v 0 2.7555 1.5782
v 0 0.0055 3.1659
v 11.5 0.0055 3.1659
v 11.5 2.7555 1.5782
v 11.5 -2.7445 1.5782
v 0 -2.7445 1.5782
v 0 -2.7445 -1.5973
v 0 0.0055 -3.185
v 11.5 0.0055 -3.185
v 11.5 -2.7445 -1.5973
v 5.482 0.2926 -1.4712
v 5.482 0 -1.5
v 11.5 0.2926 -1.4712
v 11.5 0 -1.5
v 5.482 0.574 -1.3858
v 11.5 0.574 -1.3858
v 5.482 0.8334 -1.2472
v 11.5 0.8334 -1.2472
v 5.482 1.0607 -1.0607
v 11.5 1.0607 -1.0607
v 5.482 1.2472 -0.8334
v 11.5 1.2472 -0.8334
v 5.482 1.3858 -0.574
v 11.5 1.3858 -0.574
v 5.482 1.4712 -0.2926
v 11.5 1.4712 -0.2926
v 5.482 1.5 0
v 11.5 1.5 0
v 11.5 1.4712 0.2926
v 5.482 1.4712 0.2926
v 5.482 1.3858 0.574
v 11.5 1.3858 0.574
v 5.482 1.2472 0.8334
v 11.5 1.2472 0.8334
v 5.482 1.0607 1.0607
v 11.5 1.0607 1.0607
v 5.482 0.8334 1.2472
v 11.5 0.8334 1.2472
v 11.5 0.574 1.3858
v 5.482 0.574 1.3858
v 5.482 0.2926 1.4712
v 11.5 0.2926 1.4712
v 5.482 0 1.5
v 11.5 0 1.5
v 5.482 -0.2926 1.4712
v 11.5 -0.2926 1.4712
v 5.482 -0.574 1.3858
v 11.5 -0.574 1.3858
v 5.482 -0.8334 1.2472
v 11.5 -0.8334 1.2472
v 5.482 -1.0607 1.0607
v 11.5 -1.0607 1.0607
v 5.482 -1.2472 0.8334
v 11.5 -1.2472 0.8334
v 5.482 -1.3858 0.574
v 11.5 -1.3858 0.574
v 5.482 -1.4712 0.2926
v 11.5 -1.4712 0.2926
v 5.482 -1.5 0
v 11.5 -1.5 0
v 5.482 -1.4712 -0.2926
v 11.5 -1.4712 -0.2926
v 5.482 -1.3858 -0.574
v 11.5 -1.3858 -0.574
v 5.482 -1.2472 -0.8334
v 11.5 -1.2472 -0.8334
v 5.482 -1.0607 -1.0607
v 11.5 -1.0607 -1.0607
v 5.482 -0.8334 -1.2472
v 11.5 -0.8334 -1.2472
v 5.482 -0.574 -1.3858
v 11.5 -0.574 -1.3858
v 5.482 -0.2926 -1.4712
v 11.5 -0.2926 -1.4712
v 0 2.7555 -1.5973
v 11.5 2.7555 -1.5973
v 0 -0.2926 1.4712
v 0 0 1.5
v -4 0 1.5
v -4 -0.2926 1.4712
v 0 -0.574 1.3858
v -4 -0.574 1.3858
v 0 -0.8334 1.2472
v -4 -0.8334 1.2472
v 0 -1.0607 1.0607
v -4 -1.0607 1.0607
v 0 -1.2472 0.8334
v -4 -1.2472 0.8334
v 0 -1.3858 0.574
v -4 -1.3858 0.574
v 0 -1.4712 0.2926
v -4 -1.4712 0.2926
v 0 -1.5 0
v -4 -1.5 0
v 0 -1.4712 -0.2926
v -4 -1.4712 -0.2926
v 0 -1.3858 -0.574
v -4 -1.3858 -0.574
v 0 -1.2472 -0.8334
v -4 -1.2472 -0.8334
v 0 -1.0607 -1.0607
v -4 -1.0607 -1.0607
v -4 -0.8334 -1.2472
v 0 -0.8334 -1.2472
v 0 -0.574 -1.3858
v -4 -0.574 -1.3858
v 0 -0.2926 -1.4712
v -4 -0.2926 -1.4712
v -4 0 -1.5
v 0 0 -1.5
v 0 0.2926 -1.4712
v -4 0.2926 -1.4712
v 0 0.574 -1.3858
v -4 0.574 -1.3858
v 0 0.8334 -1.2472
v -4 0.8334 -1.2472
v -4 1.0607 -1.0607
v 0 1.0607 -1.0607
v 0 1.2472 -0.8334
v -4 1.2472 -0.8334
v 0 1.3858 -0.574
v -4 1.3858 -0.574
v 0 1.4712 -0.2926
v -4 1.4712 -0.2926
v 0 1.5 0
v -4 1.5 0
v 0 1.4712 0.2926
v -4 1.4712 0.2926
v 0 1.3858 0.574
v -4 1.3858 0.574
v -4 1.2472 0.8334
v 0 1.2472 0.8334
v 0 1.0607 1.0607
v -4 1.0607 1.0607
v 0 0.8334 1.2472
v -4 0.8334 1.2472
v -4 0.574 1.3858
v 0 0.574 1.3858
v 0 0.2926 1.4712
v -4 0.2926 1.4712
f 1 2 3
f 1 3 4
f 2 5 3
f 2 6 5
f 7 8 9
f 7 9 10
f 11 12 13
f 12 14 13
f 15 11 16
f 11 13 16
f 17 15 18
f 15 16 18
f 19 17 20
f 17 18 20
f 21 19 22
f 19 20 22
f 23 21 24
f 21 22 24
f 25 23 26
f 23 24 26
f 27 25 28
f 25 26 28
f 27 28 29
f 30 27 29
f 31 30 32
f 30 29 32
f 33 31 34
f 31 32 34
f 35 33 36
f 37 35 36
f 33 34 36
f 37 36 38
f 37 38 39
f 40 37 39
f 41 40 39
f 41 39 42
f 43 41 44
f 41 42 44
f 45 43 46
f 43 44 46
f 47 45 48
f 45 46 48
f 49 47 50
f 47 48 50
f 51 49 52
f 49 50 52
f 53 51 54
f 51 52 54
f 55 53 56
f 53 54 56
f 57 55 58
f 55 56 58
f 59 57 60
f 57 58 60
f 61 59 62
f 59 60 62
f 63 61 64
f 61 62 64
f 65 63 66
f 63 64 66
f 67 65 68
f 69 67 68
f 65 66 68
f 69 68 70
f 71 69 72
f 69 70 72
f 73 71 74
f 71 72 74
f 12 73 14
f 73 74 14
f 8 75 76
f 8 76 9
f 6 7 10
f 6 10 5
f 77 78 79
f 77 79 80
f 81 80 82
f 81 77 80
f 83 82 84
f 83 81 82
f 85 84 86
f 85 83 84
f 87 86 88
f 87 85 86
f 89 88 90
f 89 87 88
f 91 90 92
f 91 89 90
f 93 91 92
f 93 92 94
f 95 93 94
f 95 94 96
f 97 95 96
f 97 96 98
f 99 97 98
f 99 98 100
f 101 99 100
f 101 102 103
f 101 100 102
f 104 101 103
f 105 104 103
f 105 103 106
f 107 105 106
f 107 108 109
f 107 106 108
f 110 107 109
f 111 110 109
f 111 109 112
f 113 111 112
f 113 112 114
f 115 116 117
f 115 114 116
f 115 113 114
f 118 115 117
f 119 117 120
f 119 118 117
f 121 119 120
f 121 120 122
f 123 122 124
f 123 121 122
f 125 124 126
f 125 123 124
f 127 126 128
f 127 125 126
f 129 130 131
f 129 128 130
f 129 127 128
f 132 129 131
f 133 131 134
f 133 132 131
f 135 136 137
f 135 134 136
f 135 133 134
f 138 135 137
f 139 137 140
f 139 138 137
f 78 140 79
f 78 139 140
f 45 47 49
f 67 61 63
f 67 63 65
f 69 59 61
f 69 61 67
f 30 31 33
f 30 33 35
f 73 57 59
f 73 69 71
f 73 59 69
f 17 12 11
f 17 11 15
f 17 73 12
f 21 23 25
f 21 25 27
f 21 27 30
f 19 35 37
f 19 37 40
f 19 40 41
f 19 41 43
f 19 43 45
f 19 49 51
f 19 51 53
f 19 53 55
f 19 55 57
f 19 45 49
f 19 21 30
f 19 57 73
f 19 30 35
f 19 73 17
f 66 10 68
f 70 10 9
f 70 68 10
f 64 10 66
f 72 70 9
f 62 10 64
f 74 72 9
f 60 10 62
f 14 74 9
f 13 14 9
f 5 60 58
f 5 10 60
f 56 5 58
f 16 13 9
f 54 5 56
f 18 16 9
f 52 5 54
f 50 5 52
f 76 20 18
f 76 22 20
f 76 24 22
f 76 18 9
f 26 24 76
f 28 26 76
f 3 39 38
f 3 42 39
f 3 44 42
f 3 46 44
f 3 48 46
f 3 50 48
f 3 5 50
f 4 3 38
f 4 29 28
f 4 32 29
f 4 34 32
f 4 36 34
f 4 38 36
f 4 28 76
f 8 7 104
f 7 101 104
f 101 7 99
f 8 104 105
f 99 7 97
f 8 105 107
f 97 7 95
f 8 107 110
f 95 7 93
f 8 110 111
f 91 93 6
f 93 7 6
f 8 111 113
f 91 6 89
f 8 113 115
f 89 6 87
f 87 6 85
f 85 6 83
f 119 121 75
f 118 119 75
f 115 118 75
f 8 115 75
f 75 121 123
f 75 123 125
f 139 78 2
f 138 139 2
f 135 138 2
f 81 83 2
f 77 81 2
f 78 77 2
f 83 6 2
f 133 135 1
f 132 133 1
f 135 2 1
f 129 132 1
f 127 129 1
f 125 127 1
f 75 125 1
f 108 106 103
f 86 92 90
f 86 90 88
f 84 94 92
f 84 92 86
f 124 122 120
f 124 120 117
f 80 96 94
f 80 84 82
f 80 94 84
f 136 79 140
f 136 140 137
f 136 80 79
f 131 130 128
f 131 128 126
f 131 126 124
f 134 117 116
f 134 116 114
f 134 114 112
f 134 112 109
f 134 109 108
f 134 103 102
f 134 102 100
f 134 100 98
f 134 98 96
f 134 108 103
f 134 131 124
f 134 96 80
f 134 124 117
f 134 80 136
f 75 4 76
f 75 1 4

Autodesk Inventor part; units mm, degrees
ref_plane "YZ Plane" through (0, 0, 0) normal (1, 0, 0) x (0, 1, 0)
ref_plane "XZ Plane" through (0, 0, 0) normal (0, 1, 0) x (-1, 0, 0)
ref_plane "XY Plane" through (0, 0, 0) normal (0, 0, 1) x (1, 0, 0)
sketch "Sketch1" plane through (0, 0, 0) normal (1, 0, 0) x (0, 1, 0)
  line L0 (0.0055, 3.1659) -> (2.7555, 1.5782)
  line L1 (2.7555, 1.5782) -> (2.7555, -1.5973)
  line L2 (2.7555, -1.5973) -> (0.0055, -3.185)
  line L3 (0.0055, -3.185) -> (-2.7445, -1.5973)
  line L4 (-2.7445, -1.5973) -> (-2.7445, 1.5782)
  line L5 (-2.7445, 1.5782) -> (0.0055, 3.1659)
  point P0 (0.0055, -0.0095)
  dimension "d1" = 5.5
extrude "Extrusion1" add sketch "Sketch1" along normal blind 11.5
sketch "Sketch2" plane through (0, 0, 0) normal (-1, 0, 0) x (0, 0, 1)
  circle A0 centre (0, 0) radius 1.5
  dimension "d4" = 3
extrude "Extrusion2" add sketch "Sketch2" along normal blind 4
sketch "Sketch3" plane through (11.5, 0, 0) normal (1, 0, 0) x (0, 0, -1)
  circle A0 centre (0, 0) radius 1.5
  dimension "d7" = 3
extrude "Extrusion3" cut sketch "Sketch3" against normal blind 6.018
properties part number "Spacer"
